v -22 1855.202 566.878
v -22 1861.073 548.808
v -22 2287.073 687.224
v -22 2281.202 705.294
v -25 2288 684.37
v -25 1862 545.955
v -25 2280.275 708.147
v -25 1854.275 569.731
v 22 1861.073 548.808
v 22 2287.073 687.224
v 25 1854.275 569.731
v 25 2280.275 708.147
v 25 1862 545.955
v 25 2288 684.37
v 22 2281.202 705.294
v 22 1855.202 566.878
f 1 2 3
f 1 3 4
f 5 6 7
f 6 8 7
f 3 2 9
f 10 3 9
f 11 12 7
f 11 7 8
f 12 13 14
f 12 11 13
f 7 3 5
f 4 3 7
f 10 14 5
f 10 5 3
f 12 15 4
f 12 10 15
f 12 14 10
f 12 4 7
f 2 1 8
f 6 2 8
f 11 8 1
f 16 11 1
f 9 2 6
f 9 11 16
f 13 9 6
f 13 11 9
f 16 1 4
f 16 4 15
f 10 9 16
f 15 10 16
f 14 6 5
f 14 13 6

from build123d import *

# Parameters (mm, degrees)
F1_DEPTH = 25
F2_W     = 44
F2_H     = 19
F3_DEPTH = 455.2712231792


# Not quite as in the source:
# - a feature names something its author has since deleted; it is built from what else it names


with BuildPart() as f1:
    # F0 (on Right) → F1 (new body, symmetric)
    with BuildSketch(Plane.YZ):
        Polygon((1862, 545.9546269485), (2050, 607.0395298403), (2042.2745751406, 630.8159427477), (1854.2745751406, 569.7310398559), align=None)
        Polygon((2042.2745751406, 630.8159427477), (2050, 607.0395298403), (2100, 623.2855146519), (2092.2745751406, 647.0619275593), align=None)
        Polygon((2092.2745751406, 647.0619275593), (2100, 623.2855146519), (2288, 684.3704175437), (2280.2745751406, 708.1468304511), align=None)
    extrude(amount=F1_DEPTH, both=True)

    # F2 (on face) → F3 (cut, through all)
    with BuildSketch(Plane(origin=(0, 1844.6468608337, 599.3620976791), x_dir=(1, 0, 0), z_dir=(0, -0.9510565163, -0.3090169944))):
        with Locations((0, -43.6559379653)):
            Rectangle(F2_W, F2_H)
    extrude(amount=-F3_DEPTH, mode=Mode.SUBTRACT)


solid = f1.part
